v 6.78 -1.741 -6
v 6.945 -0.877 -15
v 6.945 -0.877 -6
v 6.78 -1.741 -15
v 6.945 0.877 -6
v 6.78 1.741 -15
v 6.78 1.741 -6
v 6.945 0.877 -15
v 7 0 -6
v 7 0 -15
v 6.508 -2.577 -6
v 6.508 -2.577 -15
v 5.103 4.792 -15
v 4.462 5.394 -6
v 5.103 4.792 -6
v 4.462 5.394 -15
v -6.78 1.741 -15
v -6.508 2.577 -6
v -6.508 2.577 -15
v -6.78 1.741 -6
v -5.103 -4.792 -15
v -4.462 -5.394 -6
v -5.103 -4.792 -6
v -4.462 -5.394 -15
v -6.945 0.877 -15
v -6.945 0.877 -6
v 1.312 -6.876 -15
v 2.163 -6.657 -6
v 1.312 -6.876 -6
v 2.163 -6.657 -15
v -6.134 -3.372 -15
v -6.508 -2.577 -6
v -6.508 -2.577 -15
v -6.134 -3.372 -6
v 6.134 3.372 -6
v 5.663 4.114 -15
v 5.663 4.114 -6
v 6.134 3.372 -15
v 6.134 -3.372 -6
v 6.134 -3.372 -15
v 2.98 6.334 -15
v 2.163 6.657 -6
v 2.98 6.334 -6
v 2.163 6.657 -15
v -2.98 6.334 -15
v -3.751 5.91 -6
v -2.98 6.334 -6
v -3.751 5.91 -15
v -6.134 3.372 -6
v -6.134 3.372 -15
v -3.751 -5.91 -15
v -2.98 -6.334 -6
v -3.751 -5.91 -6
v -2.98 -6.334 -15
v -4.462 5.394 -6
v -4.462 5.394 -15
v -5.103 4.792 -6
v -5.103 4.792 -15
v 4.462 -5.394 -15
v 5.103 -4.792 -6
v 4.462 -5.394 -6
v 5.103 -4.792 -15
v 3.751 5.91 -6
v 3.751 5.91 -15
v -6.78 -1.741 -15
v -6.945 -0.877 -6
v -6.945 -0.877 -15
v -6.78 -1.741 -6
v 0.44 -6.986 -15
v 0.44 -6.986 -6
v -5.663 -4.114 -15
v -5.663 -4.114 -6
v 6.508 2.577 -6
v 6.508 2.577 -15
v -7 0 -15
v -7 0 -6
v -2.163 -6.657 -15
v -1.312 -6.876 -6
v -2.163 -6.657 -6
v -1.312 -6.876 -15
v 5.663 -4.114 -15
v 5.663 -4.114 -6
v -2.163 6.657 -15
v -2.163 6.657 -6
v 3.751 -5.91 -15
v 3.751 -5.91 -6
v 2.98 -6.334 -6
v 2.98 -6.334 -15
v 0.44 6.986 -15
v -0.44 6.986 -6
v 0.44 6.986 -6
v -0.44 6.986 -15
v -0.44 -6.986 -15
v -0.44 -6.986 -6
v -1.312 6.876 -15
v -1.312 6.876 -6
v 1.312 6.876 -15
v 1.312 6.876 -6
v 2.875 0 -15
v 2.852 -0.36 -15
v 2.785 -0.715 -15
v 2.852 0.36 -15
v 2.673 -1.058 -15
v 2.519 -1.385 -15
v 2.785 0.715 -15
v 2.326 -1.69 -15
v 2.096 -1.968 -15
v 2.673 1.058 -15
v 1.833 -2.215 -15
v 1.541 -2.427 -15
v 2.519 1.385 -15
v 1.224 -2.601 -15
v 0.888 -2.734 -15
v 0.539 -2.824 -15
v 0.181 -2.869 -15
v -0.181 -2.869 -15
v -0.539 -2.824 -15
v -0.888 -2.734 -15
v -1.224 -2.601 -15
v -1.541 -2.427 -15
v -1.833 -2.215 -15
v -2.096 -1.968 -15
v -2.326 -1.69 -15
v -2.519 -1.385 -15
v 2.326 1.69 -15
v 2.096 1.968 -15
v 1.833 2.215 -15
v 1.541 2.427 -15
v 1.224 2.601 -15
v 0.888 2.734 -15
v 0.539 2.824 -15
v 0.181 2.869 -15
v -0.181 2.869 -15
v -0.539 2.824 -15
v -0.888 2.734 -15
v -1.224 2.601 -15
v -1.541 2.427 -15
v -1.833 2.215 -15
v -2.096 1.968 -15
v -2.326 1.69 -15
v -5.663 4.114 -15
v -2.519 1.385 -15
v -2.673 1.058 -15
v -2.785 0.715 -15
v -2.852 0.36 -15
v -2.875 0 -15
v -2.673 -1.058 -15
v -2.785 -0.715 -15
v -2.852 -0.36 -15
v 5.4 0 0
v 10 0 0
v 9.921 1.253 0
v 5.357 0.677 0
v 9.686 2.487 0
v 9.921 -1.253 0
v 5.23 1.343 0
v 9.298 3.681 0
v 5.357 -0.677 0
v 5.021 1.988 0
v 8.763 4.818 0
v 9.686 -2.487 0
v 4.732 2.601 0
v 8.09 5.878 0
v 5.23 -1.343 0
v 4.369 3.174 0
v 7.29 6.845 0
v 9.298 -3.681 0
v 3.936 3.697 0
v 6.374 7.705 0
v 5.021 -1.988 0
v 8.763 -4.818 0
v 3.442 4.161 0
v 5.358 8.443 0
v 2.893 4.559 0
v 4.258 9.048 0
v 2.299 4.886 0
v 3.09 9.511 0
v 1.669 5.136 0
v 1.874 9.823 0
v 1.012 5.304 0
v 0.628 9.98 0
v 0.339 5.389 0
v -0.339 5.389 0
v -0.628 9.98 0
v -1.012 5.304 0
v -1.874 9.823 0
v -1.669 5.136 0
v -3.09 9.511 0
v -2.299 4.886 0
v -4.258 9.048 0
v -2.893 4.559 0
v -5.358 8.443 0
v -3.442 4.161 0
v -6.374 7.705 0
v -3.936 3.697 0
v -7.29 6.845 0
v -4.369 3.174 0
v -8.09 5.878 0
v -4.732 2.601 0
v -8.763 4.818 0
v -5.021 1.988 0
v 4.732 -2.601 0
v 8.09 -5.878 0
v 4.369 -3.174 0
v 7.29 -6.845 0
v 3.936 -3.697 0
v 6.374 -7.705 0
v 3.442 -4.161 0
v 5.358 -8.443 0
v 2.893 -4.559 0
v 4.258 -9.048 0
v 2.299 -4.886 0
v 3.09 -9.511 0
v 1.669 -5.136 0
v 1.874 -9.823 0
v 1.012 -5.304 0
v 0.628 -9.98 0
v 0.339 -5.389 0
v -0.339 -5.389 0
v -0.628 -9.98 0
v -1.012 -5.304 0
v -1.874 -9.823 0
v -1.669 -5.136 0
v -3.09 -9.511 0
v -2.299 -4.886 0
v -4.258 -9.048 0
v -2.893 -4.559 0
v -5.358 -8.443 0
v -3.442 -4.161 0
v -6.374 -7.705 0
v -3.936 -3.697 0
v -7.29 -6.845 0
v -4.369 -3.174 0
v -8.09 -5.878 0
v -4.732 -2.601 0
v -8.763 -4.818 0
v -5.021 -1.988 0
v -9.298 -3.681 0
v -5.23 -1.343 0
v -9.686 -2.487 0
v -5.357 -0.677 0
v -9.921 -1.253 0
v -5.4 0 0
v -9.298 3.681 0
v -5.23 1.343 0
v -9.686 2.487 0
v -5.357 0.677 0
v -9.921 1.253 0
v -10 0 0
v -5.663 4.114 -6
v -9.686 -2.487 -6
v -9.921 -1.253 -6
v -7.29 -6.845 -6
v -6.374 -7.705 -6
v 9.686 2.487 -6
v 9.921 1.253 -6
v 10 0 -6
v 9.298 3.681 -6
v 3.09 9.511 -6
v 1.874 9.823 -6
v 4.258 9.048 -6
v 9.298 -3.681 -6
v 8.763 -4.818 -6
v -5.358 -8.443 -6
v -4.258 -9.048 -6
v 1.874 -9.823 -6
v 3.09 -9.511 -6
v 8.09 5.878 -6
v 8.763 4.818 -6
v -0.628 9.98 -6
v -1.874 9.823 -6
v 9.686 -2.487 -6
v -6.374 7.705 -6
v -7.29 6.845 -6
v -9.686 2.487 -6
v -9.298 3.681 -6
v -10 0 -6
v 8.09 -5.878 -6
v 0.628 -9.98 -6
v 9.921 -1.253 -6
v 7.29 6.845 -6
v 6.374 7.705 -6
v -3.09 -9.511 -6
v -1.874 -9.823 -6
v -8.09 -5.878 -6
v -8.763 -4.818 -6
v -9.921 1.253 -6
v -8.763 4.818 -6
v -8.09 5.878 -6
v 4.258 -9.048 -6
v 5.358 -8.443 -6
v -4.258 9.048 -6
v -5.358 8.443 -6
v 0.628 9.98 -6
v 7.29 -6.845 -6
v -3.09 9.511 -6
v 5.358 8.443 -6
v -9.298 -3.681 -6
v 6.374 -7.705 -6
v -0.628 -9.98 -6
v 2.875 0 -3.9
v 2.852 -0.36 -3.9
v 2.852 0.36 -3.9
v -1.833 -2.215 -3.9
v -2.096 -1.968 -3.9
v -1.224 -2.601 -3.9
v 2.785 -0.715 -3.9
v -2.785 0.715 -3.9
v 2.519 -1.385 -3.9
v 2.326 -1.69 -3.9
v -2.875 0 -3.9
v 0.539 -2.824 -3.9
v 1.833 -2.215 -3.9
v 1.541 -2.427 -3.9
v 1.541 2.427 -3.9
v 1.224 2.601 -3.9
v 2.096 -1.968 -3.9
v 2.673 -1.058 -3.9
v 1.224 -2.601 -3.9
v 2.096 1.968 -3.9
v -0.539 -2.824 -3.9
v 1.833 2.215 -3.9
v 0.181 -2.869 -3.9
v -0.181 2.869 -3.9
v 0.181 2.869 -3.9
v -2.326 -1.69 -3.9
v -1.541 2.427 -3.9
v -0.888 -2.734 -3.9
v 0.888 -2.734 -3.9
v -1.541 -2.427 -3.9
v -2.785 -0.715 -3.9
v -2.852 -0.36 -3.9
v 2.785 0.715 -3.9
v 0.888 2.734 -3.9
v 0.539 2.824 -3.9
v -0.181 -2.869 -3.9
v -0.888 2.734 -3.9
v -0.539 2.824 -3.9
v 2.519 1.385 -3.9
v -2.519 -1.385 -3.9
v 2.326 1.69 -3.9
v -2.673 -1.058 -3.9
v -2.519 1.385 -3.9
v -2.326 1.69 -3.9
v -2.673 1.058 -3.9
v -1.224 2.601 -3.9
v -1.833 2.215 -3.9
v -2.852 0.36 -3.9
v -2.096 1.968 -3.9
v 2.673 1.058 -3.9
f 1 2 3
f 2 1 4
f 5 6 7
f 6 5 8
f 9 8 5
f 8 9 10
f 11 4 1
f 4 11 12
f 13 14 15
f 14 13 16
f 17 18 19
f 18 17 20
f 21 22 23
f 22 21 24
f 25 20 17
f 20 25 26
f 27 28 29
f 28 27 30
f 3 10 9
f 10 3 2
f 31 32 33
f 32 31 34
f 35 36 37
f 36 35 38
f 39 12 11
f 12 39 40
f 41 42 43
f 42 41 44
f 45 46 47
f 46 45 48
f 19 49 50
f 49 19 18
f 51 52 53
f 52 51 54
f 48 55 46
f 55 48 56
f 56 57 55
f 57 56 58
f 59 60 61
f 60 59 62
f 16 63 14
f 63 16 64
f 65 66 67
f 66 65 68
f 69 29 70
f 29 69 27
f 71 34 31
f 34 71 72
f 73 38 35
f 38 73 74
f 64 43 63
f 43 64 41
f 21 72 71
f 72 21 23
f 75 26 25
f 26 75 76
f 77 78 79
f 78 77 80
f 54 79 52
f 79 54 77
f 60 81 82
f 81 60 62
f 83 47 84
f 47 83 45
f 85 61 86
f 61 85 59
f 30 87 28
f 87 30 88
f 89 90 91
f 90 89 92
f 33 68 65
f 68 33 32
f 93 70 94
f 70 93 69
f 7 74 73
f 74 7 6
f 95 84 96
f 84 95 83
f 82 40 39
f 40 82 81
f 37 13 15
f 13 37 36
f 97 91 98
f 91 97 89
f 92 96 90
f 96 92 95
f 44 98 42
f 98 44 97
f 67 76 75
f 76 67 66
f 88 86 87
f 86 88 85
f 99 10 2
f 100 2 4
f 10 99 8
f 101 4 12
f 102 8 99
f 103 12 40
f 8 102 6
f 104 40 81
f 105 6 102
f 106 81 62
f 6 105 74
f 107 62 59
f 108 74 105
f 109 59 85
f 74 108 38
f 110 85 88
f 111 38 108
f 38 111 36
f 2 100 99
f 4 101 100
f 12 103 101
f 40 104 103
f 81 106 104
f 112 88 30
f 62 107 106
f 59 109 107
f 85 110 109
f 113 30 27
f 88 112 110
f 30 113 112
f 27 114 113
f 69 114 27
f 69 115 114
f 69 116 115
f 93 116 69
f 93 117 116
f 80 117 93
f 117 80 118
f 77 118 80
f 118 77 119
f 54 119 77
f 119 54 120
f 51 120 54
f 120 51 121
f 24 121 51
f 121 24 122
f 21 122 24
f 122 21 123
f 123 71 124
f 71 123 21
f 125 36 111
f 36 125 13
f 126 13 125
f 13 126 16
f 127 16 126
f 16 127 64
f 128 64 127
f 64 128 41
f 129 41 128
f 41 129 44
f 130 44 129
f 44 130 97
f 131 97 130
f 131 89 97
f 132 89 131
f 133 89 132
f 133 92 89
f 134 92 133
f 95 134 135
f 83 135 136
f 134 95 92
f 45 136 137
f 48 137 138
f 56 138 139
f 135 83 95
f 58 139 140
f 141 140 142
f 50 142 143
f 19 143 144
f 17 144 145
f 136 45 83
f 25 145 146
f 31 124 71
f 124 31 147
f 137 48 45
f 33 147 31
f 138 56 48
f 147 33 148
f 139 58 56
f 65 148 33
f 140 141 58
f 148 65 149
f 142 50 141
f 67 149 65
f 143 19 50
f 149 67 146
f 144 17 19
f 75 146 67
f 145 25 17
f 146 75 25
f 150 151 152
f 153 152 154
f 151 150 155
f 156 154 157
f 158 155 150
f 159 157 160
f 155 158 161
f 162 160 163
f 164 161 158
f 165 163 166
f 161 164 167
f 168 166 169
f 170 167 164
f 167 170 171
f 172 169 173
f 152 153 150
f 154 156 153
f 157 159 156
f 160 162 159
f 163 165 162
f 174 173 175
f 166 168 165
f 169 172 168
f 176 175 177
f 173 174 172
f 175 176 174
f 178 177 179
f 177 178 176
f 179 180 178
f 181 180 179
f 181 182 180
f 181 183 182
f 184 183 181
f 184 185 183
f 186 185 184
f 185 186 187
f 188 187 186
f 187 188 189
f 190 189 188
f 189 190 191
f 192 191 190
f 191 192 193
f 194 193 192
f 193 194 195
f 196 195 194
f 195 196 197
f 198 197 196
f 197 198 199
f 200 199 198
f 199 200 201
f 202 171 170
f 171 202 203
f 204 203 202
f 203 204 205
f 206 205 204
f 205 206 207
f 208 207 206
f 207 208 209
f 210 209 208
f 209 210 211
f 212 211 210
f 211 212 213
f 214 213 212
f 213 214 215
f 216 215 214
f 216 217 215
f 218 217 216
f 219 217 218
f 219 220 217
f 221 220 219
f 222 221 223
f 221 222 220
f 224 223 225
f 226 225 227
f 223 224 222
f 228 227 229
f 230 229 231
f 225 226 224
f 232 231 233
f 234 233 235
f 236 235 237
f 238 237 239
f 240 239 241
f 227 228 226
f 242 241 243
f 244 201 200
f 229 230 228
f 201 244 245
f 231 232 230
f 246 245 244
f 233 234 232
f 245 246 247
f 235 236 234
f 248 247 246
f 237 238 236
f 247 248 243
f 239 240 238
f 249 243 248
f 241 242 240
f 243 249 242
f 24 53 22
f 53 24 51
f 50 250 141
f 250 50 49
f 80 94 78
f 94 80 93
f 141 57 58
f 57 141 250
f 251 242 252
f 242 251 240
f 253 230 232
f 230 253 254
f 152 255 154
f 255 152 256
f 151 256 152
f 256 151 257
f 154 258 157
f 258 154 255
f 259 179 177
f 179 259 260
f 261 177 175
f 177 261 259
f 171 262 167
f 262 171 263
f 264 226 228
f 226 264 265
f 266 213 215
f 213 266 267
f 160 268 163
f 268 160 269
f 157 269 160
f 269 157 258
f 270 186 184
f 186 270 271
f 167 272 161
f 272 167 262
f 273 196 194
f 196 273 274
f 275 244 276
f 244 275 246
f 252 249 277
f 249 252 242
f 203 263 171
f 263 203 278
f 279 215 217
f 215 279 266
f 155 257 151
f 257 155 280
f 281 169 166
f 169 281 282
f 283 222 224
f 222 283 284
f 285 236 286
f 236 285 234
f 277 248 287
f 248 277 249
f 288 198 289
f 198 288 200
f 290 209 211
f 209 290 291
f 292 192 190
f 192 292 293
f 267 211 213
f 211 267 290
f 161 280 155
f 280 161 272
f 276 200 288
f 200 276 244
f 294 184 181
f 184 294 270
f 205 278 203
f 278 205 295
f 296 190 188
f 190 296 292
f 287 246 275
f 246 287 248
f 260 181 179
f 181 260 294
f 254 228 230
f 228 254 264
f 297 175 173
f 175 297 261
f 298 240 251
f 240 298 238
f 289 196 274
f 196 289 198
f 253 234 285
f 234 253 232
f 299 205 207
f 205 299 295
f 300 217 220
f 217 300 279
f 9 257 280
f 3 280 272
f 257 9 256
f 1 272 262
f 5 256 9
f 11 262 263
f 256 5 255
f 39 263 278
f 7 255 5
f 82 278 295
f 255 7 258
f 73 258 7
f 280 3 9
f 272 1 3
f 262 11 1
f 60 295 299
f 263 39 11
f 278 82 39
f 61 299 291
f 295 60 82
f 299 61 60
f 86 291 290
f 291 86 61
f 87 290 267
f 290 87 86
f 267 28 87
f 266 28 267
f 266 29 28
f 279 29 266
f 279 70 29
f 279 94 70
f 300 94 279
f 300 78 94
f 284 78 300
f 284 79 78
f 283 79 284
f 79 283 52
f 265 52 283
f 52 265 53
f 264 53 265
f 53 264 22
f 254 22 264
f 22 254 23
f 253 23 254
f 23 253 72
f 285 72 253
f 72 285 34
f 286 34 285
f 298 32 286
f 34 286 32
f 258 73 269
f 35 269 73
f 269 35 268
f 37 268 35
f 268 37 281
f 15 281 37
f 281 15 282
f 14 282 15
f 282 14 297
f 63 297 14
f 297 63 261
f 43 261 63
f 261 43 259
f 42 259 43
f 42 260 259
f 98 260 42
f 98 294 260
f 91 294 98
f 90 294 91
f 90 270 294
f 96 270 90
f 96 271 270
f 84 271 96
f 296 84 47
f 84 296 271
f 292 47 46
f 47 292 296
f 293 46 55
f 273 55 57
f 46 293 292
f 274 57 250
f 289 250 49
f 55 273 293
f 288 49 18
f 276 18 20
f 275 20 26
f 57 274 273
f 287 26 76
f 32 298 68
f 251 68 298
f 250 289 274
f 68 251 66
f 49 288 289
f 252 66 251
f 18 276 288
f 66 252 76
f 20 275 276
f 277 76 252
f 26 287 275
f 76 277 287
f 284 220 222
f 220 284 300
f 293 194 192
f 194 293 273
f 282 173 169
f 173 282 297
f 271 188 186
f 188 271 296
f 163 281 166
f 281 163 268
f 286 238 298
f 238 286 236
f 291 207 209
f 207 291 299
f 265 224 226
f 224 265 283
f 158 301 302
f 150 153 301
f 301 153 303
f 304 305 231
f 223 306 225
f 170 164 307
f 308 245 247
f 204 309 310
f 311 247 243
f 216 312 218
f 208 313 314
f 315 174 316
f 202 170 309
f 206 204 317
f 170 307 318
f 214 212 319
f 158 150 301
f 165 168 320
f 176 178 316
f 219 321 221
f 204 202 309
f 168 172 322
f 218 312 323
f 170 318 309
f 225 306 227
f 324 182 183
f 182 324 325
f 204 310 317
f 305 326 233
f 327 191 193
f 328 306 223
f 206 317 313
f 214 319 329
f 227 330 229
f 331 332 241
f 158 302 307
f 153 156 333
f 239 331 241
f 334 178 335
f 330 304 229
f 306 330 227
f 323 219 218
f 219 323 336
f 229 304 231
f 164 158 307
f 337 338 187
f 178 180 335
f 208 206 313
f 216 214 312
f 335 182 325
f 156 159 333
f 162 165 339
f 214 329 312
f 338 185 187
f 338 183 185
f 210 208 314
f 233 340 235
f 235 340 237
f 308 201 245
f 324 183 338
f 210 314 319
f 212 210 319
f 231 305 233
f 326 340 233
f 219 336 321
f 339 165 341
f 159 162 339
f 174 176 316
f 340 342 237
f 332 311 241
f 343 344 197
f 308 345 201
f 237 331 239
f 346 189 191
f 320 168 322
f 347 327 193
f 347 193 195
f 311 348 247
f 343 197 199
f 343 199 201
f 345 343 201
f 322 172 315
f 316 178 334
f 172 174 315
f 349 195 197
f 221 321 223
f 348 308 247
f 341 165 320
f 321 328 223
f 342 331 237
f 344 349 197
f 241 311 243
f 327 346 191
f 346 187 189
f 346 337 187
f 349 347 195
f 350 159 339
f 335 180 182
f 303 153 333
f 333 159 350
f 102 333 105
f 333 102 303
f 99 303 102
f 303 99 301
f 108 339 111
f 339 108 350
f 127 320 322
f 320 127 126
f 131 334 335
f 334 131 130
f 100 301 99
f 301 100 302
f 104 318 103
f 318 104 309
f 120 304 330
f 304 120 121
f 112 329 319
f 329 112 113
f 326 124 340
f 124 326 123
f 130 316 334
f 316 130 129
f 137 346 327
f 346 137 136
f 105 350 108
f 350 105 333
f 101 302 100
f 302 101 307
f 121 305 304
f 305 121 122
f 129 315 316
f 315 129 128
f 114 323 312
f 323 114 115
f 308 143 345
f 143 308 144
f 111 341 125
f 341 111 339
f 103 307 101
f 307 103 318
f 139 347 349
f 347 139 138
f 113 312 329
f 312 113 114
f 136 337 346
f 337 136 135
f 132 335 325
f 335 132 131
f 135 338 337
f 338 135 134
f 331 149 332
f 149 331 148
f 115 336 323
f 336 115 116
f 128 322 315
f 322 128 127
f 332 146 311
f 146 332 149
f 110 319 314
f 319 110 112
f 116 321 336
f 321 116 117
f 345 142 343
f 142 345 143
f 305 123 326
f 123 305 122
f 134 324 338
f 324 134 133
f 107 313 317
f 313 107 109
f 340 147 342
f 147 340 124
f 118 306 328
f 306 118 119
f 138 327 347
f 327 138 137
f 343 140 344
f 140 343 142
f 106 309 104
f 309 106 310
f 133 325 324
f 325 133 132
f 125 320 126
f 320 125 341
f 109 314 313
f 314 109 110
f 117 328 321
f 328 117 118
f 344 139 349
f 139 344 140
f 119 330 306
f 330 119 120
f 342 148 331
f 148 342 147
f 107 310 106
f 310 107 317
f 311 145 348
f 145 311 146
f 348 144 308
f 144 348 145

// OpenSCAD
$fn = 50;


difference() {
	union() {
		translate(v = [0, 0, -15.0000000000]) {
			cylinder(h = 15, r = 7.0000000000);
		}
		translate(v = [0, 0, -6.0000000000]) {
			cylinder(h = 6, r = 10.0000000000);
		}
	}
	union() {
		translate(v = [0, 0, 0]) {
			rotate(a = [0, 0, 0]) {
				difference() {
					union() {
						#translate(v = [0, 0, -15.0000000000]) {
							cylinder(h = 15, r = 2.6000000000);
						}
						#translate(v = [0, 0, -3.9000000000]) {
							cylinder(h = 3.9000000000, r1 = 2.8750000000, r2 = 5.4000000000);
						}
						#translate(v = [0, 0, -15.0000000000]) {
							cylinder(h = 15, r = 2.8750000000);
						}
						#translate(v = [0, 0, -15.0000000000]) {
							cylinder(h = 15, r = 2.6000000000);
						}
					}
					union();
				}
			}
		}
	}
}
